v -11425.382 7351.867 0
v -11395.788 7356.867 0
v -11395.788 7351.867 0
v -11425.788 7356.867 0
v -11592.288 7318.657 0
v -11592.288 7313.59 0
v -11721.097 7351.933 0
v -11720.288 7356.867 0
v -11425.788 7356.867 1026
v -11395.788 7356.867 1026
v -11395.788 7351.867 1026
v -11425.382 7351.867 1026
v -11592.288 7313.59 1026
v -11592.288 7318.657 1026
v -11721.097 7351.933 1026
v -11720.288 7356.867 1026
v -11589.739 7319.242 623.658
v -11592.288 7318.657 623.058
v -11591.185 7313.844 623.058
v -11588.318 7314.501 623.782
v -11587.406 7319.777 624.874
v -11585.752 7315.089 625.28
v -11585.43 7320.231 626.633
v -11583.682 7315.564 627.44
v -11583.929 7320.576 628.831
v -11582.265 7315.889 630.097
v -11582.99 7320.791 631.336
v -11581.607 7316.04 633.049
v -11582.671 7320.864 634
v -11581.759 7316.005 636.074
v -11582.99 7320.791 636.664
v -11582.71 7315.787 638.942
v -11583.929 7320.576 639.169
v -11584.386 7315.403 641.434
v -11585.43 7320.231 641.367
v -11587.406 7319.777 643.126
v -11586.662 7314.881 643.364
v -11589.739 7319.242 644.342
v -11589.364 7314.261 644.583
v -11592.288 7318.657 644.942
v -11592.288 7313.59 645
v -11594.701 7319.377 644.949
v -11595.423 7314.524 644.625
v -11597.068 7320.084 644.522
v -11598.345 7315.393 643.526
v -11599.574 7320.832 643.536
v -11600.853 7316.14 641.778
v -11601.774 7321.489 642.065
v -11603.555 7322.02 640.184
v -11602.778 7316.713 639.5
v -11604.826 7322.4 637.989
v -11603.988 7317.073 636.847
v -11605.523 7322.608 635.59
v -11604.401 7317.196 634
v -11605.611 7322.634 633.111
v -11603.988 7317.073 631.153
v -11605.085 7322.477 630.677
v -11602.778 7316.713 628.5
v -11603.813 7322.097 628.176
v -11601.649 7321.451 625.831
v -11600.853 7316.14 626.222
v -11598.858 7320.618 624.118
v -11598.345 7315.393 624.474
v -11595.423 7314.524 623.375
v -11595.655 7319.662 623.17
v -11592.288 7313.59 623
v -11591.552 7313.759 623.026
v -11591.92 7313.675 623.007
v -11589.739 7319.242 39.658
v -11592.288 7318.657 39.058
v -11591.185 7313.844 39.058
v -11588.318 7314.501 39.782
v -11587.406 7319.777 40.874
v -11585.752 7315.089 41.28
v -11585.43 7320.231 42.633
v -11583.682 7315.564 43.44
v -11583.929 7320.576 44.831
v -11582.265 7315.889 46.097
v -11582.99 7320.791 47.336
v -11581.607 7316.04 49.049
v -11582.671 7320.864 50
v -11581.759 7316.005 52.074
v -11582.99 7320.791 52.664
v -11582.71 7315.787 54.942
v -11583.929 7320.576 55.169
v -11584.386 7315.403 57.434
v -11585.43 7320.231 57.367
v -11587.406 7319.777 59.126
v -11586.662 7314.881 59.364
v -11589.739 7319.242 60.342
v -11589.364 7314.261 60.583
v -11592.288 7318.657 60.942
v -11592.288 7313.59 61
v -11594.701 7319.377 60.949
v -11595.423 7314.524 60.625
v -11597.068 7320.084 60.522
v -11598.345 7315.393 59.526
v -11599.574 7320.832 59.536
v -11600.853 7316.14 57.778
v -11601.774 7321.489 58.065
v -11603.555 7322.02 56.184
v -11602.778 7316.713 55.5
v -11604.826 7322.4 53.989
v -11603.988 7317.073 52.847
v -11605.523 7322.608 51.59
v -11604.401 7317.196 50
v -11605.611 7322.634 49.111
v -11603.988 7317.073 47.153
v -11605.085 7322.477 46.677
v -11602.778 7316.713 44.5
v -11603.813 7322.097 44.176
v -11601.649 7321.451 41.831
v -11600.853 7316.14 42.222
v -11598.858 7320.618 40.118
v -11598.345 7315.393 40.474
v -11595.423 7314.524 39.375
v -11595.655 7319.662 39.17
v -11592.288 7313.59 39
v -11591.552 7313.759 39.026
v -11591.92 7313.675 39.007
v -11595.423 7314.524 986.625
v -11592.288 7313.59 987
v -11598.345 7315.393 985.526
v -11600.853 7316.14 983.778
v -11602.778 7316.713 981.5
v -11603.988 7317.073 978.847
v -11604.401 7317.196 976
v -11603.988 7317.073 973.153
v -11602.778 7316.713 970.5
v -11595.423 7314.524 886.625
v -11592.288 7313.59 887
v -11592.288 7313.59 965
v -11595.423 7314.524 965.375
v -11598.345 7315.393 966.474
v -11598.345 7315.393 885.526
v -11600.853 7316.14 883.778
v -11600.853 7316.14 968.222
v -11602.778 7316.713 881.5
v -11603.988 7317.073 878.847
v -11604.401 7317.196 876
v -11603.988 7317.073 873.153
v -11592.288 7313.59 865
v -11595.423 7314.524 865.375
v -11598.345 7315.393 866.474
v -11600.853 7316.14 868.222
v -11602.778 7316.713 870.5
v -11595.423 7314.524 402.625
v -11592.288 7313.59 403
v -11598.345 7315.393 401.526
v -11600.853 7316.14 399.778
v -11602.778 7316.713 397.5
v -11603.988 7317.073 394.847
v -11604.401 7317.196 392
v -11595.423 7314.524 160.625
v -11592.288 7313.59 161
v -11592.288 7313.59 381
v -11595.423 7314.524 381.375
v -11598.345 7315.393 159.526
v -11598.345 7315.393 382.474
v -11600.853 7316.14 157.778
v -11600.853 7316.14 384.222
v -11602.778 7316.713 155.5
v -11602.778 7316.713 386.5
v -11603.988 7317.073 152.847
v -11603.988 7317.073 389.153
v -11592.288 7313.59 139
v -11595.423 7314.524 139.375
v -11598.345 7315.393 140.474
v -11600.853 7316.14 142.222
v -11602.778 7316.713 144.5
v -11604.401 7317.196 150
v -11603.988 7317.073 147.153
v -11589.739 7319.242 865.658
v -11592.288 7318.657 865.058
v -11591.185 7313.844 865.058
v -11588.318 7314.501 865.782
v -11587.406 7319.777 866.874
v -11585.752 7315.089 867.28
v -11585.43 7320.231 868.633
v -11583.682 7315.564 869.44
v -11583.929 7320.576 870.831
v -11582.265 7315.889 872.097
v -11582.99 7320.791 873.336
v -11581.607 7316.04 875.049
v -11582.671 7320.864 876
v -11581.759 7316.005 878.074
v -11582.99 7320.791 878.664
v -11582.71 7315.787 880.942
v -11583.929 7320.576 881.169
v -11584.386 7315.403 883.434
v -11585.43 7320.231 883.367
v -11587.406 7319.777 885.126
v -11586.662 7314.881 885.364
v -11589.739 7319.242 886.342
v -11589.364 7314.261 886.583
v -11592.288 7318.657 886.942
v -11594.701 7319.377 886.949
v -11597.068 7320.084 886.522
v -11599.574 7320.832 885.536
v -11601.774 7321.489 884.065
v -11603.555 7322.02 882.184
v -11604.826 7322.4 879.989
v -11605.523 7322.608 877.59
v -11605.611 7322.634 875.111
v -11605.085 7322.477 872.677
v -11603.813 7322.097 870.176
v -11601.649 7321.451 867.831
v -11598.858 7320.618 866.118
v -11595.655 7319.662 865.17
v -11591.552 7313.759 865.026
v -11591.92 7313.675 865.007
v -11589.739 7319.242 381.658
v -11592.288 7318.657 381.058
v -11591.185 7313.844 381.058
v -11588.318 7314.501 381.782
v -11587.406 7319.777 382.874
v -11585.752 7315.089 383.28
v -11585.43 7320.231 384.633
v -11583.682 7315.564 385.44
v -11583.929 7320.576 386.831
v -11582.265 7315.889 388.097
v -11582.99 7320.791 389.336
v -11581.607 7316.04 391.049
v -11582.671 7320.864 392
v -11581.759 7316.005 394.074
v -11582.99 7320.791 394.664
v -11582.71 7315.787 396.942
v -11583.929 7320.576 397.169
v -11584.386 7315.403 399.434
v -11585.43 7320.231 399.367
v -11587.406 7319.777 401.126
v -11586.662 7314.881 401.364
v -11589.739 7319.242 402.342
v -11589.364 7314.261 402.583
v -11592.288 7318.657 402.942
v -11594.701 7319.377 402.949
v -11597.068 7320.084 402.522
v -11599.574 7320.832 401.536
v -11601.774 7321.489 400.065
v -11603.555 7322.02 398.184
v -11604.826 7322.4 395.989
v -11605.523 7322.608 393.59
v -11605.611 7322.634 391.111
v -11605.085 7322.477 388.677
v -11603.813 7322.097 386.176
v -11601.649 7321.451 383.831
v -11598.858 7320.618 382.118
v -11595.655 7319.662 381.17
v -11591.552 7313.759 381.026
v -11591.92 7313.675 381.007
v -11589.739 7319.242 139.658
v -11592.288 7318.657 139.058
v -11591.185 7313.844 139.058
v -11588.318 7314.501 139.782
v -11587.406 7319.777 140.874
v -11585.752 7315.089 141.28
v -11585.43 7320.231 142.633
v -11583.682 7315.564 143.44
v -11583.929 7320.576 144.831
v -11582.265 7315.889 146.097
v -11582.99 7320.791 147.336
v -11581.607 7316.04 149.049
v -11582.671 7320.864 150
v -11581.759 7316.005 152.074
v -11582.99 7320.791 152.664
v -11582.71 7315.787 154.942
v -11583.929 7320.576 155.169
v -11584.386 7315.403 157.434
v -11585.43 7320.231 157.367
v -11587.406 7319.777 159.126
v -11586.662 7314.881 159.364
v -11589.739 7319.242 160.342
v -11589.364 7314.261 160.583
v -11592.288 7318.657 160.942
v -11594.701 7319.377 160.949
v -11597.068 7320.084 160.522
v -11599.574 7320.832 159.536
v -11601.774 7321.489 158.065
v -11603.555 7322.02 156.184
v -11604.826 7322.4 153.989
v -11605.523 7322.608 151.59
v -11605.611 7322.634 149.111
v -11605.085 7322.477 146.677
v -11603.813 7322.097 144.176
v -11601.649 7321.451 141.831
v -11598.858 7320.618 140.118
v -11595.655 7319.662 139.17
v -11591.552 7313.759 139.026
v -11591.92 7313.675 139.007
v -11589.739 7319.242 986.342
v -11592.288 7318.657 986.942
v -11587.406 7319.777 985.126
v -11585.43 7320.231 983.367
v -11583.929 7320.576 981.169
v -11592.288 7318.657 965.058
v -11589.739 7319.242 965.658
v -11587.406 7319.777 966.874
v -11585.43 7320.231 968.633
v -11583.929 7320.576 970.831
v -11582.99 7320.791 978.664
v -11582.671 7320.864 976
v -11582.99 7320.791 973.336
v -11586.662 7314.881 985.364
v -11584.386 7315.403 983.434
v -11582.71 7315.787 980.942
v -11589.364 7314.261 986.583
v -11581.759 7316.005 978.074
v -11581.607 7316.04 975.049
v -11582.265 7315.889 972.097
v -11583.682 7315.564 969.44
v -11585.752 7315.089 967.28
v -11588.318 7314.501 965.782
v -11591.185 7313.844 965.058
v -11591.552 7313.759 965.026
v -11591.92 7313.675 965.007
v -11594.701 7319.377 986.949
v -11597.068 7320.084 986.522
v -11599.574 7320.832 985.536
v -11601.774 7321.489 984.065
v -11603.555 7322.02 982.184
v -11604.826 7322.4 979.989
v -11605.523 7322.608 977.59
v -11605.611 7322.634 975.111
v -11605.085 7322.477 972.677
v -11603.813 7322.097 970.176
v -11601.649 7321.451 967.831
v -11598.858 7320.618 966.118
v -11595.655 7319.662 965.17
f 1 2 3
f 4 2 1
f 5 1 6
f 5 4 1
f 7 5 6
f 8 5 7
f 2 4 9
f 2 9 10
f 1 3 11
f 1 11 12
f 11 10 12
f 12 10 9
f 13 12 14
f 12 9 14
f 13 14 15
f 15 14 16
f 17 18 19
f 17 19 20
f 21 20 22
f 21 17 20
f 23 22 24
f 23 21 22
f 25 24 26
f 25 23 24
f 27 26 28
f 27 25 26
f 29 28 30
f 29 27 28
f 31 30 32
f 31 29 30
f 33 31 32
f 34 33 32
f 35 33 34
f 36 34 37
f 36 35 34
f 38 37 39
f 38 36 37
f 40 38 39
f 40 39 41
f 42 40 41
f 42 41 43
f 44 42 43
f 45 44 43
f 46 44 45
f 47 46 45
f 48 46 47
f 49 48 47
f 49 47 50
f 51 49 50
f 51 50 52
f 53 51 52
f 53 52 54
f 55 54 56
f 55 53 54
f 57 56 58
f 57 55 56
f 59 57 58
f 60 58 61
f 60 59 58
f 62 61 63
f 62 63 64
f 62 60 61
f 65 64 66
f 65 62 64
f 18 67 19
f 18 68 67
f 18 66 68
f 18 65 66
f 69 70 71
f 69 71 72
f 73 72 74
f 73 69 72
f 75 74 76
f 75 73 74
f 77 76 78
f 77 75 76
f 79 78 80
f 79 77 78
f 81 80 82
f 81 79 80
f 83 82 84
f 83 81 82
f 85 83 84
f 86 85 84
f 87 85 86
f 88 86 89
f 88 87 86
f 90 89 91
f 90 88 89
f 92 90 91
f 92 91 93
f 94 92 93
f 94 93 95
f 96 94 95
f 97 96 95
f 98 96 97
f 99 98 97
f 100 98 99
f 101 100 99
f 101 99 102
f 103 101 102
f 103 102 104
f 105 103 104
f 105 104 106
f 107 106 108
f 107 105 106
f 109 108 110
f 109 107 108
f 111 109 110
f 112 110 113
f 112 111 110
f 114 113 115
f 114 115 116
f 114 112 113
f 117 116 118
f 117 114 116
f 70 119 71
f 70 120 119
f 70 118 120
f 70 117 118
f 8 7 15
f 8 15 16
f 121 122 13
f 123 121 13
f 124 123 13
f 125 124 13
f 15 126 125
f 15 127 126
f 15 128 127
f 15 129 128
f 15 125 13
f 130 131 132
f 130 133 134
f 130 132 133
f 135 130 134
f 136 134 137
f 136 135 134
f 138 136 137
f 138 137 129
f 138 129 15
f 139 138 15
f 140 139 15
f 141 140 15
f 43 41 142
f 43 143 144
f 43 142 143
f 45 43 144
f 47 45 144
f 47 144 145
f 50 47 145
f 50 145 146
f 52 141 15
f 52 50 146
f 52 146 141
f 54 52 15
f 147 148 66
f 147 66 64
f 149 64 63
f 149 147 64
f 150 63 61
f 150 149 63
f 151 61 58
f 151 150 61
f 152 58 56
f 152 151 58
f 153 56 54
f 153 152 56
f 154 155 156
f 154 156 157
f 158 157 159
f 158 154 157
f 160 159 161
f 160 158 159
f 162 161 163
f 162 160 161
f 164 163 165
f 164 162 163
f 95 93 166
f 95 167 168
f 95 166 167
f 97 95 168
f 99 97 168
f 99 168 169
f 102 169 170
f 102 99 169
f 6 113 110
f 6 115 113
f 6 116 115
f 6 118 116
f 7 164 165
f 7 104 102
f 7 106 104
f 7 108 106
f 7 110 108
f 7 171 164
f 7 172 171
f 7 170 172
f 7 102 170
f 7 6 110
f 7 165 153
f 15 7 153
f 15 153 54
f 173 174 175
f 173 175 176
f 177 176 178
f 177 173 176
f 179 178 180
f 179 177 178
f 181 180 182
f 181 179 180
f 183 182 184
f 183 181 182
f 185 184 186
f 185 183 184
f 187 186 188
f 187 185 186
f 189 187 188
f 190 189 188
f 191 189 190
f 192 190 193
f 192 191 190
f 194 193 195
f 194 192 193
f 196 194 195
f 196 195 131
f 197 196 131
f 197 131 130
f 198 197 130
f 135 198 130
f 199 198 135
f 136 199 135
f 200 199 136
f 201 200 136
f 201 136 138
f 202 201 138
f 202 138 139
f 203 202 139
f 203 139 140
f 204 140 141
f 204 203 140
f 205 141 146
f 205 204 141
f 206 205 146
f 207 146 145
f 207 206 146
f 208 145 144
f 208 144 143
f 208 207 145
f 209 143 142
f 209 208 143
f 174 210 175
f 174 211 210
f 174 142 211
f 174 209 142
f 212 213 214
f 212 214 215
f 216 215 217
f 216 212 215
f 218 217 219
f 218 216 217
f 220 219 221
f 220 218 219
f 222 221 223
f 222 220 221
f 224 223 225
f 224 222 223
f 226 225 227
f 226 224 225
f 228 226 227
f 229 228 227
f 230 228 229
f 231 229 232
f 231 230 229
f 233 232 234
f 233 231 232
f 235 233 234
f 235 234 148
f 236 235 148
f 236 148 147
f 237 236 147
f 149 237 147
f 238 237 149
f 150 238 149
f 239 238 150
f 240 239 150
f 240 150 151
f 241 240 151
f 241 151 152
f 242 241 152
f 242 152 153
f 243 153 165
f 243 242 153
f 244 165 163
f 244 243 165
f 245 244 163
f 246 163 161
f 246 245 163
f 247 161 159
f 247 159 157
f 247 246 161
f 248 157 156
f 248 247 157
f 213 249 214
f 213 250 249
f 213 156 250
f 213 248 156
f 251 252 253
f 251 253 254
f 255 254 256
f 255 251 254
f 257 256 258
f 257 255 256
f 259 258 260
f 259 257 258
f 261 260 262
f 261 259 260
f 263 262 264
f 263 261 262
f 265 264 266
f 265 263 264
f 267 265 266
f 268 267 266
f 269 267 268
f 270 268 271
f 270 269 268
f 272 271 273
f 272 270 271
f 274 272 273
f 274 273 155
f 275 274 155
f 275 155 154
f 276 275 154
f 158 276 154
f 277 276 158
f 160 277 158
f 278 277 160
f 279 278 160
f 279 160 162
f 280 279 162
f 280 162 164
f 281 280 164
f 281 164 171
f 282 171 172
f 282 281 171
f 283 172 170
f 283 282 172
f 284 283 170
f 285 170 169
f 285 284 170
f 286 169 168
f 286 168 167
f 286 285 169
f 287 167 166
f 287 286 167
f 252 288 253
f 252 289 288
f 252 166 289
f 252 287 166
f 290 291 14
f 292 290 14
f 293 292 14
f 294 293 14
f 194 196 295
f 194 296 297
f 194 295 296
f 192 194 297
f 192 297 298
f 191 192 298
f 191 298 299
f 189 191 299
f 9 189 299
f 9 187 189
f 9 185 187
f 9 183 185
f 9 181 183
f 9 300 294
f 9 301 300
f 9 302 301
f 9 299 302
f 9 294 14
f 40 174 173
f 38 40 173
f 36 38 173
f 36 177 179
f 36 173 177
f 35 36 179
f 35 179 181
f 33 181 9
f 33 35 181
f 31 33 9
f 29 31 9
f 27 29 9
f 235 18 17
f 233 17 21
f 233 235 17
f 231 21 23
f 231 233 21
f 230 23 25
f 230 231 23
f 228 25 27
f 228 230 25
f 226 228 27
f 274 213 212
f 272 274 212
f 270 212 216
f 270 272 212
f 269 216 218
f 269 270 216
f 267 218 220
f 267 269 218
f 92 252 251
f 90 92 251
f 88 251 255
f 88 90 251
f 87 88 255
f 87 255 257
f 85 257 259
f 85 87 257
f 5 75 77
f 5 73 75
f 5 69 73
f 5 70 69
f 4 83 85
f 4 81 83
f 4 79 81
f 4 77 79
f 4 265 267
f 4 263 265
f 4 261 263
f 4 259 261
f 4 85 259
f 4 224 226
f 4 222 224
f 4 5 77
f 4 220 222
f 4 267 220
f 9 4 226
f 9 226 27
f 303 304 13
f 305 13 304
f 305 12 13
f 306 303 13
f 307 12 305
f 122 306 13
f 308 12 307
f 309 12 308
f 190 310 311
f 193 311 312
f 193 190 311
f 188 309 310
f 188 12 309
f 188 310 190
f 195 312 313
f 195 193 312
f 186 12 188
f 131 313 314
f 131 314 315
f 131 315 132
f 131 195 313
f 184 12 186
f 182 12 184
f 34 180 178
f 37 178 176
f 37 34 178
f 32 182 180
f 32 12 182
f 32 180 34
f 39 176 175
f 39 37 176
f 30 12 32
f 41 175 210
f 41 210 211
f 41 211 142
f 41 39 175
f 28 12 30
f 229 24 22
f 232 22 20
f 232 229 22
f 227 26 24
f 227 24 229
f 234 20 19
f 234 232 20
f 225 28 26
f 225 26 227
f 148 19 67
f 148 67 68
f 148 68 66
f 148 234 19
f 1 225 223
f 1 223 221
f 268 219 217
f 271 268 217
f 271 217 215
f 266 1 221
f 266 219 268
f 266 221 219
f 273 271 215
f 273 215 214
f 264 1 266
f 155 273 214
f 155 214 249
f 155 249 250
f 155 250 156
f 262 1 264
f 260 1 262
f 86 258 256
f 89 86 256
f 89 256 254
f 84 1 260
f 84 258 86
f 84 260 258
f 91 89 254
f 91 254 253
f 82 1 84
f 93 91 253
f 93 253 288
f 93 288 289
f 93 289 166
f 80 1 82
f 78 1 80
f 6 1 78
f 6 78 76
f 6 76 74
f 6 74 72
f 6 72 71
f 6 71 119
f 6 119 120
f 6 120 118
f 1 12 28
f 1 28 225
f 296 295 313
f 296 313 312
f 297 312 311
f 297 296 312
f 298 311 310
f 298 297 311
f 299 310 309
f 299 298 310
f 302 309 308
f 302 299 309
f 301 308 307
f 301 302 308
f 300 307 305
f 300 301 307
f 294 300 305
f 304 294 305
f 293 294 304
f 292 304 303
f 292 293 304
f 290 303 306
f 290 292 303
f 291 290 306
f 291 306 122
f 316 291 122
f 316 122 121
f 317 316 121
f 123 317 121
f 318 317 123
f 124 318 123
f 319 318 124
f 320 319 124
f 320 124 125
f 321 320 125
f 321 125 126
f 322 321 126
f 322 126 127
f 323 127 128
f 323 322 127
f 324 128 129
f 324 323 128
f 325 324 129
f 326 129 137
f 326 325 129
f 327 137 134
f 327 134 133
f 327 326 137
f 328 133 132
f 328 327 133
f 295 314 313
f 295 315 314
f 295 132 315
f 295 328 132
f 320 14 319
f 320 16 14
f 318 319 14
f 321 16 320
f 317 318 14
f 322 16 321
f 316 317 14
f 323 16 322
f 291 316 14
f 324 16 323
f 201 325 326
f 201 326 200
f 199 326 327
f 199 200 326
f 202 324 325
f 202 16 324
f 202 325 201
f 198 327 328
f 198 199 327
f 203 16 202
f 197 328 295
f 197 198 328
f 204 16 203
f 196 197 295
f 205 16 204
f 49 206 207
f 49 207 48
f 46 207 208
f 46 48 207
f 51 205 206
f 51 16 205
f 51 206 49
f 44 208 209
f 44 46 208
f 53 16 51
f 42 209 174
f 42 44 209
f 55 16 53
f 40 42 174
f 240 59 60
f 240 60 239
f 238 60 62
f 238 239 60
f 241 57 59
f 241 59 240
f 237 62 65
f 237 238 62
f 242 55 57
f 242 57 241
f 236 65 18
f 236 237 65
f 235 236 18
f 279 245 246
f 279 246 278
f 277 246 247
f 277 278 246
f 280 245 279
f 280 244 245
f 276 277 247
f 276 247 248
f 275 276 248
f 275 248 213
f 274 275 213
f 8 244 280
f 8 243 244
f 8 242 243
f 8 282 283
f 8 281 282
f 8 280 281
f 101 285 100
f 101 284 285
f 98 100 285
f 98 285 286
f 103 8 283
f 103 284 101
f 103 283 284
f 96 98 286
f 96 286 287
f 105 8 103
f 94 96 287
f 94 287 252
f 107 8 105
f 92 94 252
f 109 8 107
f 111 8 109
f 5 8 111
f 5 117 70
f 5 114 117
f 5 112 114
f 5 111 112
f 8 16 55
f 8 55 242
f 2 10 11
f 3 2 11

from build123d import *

# Parameters (mm, degrees)
BOSS_EXTRUDE1_DEPTH     = 1026
CUT_EXTRUDE1_DEPTH      = 9844.379832938
CUT_EXTRUDE1_DEPTH_BACK = 9844.379832938
SKETCH2_R               = 11


with BuildPart() as part:
    # Sketch1 → Boss-Extrude1 (new body)
    with BuildSketch(Plane.XY):
        Polygon((-11592.288440525, 7313.590405803), (-11721.096751517, 7351.933229733), (-11720.288440525, 7356.867460508), (-11592.288440525, 7318.657051678), (-11425.788440525, 7356.867460508), (-11395.788440525, 7356.867460508), (-11395.788440525, 7351.867460508), (-11425.381609332, 7351.867460508), align=None)
    extrude(amount=BOSS_EXTRUDE1_DEPTH)

    # Sketch2 → Cut-Extrude1 (cut, two sides: drawn at the far end of the back side and taken through both)
    with BuildSketch(Plane(origin=(-2172.647475249, 9473.814226158, 0), x_dir=(0.9746972479016649, 0.22352913665318996, 0), z_dir=(0.22352913665318996, -0.9746972479016649, 0)).offset(-CUT_EXTRUDE1_DEPTH_BACK)):
        with Locations(Location((-9664.171090618, 50, 0), (0, 0, 275.90955698))):
            Circle(SKETCH2_R)
        with Locations(Location((-9664.171090618, 150, 0), (0, 0, 275.90955698))):
            Circle(SKETCH2_R)
        with Locations(Location((-9664.171090618, 392, 0), (0, 0, 275.90955698))):
            Circle(SKETCH2_R)
        with Locations(Location((-9664.171090618, 876, 0), (0, 0, 275.90955698))):
            Circle(SKETCH2_R)
        with Locations(Location((-9664.171090618, 976, 0), (0, 0, 275.90955698))):
            Circle(SKETCH2_R)
        with Locations(Location((-9664.171090618, 634, 0), (0, 0, 275.90955698))):
            Circle(SKETCH2_R)
    extrude(amount=CUT_EXTRUDE1_DEPTH + CUT_EXTRUDE1_DEPTH_BACK, mode=Mode.SUBTRACT)


solid = part.part
